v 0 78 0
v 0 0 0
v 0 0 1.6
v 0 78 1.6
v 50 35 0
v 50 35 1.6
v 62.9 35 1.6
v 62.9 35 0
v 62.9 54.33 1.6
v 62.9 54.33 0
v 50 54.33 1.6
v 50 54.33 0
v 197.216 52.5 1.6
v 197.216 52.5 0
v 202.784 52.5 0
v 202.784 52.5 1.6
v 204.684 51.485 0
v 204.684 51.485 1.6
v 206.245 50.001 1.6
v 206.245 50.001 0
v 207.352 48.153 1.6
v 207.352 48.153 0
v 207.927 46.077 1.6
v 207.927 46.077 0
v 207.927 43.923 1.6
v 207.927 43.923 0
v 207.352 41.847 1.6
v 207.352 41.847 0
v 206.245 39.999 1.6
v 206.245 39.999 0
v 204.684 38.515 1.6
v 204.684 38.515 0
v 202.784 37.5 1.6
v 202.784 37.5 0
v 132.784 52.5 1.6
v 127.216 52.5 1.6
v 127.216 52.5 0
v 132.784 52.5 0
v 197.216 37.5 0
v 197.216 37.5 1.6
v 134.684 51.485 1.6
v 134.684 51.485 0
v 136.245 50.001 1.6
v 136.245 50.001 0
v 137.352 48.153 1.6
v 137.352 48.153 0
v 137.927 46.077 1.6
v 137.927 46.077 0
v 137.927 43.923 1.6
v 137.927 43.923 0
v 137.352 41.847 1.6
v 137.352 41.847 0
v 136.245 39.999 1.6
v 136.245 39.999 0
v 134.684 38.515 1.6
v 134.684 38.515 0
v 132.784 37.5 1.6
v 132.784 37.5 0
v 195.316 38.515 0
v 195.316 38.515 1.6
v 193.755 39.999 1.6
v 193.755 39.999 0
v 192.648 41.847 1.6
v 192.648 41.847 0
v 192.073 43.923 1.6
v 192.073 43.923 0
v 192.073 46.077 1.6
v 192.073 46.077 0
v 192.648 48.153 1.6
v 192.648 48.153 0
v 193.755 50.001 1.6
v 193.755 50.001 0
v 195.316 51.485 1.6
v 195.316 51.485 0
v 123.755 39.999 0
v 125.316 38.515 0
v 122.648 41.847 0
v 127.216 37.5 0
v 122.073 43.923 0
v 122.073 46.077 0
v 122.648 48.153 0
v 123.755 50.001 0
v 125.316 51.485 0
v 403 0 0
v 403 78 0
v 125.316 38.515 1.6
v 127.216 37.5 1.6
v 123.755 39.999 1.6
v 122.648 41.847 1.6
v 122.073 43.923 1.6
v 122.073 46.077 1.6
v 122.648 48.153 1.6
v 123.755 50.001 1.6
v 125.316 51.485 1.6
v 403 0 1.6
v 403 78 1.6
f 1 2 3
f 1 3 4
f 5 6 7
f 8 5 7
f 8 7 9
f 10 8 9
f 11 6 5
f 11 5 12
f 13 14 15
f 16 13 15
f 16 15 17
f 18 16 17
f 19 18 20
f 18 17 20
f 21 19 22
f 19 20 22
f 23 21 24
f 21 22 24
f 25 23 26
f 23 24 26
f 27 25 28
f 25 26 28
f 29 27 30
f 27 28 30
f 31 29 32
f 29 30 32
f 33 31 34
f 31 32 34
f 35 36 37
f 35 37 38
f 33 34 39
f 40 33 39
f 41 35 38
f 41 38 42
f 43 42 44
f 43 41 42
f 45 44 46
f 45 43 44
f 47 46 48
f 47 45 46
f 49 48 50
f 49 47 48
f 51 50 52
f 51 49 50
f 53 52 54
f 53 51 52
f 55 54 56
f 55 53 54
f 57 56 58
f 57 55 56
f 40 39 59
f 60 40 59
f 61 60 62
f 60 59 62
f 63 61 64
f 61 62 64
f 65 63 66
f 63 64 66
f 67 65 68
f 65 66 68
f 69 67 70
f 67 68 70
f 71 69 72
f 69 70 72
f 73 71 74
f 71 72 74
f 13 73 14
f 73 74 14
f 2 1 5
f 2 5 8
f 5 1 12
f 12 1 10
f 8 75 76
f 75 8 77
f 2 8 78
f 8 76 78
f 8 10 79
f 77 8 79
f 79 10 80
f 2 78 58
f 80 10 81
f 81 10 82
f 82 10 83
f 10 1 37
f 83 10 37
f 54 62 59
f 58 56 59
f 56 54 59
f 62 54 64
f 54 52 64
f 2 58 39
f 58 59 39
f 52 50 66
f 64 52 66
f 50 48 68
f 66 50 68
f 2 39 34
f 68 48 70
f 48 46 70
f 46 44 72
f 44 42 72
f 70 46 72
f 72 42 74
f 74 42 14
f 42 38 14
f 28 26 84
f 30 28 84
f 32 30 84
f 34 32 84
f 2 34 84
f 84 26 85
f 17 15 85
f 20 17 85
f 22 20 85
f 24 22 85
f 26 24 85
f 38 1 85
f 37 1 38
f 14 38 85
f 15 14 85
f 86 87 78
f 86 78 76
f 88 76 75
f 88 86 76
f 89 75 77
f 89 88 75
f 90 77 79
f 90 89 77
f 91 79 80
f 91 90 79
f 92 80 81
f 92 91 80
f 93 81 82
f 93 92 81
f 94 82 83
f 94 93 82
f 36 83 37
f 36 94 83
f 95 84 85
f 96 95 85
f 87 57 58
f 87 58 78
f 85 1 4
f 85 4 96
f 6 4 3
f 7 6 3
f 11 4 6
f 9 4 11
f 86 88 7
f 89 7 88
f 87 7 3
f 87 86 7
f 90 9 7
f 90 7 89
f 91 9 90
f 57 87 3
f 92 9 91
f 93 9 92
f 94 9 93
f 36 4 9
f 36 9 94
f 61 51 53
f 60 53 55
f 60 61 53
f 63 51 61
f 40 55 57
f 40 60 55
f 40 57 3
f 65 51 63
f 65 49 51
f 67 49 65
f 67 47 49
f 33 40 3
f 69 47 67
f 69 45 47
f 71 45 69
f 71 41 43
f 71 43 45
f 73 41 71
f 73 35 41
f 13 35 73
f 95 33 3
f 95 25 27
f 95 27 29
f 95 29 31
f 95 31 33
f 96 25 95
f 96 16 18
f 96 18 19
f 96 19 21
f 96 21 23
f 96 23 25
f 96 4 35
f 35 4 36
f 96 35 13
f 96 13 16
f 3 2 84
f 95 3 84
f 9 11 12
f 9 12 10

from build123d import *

# Parameters (mm, degrees)
PANEL_W             = 403
PANEL_H             = 78
BOSS_EXTRUDE1_DEPTH = 1.6
ROCKER_SWITCH_W     = 12.9
ROCKER_SWITCH_H     = 19.33
CUT_EXTRUDE2_DEPTH  = 10
CUT_EXTRUDE4_DEPTH  = 10
CUT_EXTRUDE6_DEPTH  = 10


with BuildPart() as part:
    # Panel → Boss-Extrude1 (new body)
    with BuildSketch(Plane.XY):
        with Locations((201.5, 39)):
            Rectangle(PANEL_W, PANEL_H)
    extrude(amount=BOSS_EXTRUDE1_DEPTH)

    # Rocker_Switch → Cut-Extrude2 (cut)
    with BuildSketch(Plane.XY.offset(1.6)):
        with Locations((56.45, 44.665)):
            Rectangle(ROCKER_SWITCH_W, ROCKER_SWITCH_H)
    extrude(amount=-CUT_EXTRUDE2_DEPTH, mode=Mode.SUBTRACT)

    # Turbo → Cut-Extrude4 (cut)
    with BuildSketch(Plane.XY):
        with BuildLine():
            Line((197.216263462, 52.500054059), (202.783736538, 52.500054059))
            ThreePointArc((202.783736538, 52.500054059), (208, 45), (202.783736538, 37.499945941))
            Line((202.783736538, 37.499945941), (197.216263462, 37.499945941))
            ThreePointArc((197.216263462, 37.499945941), (192, 45), (197.216263462, 52.500054059))
        make_face()
    extrude(amount=CUT_EXTRUDE4_DEPTH, mode=Mode.SUBTRACT)

    # En/Disable → Cut-Extrude6 (cut)
    with BuildSketch(Plane.XY.offset(1.6)):
        with BuildLine():
            Line((127.216263462, 52.500054059), (132.783736538, 52.500054059))
            ThreePointArc((132.783736538, 52.500054059), (138, 45), (132.783736538, 37.499945941))
            Line((132.783736538, 37.499945941), (127.216263462, 37.499945941))
            ThreePointArc((127.216263462, 37.499945941), (122, 45), (127.216263462, 52.500054059))
        make_face()
    extrude(amount=-CUT_EXTRUDE6_DEPTH, mode=Mode.SUBTRACT)


solid = part.part
